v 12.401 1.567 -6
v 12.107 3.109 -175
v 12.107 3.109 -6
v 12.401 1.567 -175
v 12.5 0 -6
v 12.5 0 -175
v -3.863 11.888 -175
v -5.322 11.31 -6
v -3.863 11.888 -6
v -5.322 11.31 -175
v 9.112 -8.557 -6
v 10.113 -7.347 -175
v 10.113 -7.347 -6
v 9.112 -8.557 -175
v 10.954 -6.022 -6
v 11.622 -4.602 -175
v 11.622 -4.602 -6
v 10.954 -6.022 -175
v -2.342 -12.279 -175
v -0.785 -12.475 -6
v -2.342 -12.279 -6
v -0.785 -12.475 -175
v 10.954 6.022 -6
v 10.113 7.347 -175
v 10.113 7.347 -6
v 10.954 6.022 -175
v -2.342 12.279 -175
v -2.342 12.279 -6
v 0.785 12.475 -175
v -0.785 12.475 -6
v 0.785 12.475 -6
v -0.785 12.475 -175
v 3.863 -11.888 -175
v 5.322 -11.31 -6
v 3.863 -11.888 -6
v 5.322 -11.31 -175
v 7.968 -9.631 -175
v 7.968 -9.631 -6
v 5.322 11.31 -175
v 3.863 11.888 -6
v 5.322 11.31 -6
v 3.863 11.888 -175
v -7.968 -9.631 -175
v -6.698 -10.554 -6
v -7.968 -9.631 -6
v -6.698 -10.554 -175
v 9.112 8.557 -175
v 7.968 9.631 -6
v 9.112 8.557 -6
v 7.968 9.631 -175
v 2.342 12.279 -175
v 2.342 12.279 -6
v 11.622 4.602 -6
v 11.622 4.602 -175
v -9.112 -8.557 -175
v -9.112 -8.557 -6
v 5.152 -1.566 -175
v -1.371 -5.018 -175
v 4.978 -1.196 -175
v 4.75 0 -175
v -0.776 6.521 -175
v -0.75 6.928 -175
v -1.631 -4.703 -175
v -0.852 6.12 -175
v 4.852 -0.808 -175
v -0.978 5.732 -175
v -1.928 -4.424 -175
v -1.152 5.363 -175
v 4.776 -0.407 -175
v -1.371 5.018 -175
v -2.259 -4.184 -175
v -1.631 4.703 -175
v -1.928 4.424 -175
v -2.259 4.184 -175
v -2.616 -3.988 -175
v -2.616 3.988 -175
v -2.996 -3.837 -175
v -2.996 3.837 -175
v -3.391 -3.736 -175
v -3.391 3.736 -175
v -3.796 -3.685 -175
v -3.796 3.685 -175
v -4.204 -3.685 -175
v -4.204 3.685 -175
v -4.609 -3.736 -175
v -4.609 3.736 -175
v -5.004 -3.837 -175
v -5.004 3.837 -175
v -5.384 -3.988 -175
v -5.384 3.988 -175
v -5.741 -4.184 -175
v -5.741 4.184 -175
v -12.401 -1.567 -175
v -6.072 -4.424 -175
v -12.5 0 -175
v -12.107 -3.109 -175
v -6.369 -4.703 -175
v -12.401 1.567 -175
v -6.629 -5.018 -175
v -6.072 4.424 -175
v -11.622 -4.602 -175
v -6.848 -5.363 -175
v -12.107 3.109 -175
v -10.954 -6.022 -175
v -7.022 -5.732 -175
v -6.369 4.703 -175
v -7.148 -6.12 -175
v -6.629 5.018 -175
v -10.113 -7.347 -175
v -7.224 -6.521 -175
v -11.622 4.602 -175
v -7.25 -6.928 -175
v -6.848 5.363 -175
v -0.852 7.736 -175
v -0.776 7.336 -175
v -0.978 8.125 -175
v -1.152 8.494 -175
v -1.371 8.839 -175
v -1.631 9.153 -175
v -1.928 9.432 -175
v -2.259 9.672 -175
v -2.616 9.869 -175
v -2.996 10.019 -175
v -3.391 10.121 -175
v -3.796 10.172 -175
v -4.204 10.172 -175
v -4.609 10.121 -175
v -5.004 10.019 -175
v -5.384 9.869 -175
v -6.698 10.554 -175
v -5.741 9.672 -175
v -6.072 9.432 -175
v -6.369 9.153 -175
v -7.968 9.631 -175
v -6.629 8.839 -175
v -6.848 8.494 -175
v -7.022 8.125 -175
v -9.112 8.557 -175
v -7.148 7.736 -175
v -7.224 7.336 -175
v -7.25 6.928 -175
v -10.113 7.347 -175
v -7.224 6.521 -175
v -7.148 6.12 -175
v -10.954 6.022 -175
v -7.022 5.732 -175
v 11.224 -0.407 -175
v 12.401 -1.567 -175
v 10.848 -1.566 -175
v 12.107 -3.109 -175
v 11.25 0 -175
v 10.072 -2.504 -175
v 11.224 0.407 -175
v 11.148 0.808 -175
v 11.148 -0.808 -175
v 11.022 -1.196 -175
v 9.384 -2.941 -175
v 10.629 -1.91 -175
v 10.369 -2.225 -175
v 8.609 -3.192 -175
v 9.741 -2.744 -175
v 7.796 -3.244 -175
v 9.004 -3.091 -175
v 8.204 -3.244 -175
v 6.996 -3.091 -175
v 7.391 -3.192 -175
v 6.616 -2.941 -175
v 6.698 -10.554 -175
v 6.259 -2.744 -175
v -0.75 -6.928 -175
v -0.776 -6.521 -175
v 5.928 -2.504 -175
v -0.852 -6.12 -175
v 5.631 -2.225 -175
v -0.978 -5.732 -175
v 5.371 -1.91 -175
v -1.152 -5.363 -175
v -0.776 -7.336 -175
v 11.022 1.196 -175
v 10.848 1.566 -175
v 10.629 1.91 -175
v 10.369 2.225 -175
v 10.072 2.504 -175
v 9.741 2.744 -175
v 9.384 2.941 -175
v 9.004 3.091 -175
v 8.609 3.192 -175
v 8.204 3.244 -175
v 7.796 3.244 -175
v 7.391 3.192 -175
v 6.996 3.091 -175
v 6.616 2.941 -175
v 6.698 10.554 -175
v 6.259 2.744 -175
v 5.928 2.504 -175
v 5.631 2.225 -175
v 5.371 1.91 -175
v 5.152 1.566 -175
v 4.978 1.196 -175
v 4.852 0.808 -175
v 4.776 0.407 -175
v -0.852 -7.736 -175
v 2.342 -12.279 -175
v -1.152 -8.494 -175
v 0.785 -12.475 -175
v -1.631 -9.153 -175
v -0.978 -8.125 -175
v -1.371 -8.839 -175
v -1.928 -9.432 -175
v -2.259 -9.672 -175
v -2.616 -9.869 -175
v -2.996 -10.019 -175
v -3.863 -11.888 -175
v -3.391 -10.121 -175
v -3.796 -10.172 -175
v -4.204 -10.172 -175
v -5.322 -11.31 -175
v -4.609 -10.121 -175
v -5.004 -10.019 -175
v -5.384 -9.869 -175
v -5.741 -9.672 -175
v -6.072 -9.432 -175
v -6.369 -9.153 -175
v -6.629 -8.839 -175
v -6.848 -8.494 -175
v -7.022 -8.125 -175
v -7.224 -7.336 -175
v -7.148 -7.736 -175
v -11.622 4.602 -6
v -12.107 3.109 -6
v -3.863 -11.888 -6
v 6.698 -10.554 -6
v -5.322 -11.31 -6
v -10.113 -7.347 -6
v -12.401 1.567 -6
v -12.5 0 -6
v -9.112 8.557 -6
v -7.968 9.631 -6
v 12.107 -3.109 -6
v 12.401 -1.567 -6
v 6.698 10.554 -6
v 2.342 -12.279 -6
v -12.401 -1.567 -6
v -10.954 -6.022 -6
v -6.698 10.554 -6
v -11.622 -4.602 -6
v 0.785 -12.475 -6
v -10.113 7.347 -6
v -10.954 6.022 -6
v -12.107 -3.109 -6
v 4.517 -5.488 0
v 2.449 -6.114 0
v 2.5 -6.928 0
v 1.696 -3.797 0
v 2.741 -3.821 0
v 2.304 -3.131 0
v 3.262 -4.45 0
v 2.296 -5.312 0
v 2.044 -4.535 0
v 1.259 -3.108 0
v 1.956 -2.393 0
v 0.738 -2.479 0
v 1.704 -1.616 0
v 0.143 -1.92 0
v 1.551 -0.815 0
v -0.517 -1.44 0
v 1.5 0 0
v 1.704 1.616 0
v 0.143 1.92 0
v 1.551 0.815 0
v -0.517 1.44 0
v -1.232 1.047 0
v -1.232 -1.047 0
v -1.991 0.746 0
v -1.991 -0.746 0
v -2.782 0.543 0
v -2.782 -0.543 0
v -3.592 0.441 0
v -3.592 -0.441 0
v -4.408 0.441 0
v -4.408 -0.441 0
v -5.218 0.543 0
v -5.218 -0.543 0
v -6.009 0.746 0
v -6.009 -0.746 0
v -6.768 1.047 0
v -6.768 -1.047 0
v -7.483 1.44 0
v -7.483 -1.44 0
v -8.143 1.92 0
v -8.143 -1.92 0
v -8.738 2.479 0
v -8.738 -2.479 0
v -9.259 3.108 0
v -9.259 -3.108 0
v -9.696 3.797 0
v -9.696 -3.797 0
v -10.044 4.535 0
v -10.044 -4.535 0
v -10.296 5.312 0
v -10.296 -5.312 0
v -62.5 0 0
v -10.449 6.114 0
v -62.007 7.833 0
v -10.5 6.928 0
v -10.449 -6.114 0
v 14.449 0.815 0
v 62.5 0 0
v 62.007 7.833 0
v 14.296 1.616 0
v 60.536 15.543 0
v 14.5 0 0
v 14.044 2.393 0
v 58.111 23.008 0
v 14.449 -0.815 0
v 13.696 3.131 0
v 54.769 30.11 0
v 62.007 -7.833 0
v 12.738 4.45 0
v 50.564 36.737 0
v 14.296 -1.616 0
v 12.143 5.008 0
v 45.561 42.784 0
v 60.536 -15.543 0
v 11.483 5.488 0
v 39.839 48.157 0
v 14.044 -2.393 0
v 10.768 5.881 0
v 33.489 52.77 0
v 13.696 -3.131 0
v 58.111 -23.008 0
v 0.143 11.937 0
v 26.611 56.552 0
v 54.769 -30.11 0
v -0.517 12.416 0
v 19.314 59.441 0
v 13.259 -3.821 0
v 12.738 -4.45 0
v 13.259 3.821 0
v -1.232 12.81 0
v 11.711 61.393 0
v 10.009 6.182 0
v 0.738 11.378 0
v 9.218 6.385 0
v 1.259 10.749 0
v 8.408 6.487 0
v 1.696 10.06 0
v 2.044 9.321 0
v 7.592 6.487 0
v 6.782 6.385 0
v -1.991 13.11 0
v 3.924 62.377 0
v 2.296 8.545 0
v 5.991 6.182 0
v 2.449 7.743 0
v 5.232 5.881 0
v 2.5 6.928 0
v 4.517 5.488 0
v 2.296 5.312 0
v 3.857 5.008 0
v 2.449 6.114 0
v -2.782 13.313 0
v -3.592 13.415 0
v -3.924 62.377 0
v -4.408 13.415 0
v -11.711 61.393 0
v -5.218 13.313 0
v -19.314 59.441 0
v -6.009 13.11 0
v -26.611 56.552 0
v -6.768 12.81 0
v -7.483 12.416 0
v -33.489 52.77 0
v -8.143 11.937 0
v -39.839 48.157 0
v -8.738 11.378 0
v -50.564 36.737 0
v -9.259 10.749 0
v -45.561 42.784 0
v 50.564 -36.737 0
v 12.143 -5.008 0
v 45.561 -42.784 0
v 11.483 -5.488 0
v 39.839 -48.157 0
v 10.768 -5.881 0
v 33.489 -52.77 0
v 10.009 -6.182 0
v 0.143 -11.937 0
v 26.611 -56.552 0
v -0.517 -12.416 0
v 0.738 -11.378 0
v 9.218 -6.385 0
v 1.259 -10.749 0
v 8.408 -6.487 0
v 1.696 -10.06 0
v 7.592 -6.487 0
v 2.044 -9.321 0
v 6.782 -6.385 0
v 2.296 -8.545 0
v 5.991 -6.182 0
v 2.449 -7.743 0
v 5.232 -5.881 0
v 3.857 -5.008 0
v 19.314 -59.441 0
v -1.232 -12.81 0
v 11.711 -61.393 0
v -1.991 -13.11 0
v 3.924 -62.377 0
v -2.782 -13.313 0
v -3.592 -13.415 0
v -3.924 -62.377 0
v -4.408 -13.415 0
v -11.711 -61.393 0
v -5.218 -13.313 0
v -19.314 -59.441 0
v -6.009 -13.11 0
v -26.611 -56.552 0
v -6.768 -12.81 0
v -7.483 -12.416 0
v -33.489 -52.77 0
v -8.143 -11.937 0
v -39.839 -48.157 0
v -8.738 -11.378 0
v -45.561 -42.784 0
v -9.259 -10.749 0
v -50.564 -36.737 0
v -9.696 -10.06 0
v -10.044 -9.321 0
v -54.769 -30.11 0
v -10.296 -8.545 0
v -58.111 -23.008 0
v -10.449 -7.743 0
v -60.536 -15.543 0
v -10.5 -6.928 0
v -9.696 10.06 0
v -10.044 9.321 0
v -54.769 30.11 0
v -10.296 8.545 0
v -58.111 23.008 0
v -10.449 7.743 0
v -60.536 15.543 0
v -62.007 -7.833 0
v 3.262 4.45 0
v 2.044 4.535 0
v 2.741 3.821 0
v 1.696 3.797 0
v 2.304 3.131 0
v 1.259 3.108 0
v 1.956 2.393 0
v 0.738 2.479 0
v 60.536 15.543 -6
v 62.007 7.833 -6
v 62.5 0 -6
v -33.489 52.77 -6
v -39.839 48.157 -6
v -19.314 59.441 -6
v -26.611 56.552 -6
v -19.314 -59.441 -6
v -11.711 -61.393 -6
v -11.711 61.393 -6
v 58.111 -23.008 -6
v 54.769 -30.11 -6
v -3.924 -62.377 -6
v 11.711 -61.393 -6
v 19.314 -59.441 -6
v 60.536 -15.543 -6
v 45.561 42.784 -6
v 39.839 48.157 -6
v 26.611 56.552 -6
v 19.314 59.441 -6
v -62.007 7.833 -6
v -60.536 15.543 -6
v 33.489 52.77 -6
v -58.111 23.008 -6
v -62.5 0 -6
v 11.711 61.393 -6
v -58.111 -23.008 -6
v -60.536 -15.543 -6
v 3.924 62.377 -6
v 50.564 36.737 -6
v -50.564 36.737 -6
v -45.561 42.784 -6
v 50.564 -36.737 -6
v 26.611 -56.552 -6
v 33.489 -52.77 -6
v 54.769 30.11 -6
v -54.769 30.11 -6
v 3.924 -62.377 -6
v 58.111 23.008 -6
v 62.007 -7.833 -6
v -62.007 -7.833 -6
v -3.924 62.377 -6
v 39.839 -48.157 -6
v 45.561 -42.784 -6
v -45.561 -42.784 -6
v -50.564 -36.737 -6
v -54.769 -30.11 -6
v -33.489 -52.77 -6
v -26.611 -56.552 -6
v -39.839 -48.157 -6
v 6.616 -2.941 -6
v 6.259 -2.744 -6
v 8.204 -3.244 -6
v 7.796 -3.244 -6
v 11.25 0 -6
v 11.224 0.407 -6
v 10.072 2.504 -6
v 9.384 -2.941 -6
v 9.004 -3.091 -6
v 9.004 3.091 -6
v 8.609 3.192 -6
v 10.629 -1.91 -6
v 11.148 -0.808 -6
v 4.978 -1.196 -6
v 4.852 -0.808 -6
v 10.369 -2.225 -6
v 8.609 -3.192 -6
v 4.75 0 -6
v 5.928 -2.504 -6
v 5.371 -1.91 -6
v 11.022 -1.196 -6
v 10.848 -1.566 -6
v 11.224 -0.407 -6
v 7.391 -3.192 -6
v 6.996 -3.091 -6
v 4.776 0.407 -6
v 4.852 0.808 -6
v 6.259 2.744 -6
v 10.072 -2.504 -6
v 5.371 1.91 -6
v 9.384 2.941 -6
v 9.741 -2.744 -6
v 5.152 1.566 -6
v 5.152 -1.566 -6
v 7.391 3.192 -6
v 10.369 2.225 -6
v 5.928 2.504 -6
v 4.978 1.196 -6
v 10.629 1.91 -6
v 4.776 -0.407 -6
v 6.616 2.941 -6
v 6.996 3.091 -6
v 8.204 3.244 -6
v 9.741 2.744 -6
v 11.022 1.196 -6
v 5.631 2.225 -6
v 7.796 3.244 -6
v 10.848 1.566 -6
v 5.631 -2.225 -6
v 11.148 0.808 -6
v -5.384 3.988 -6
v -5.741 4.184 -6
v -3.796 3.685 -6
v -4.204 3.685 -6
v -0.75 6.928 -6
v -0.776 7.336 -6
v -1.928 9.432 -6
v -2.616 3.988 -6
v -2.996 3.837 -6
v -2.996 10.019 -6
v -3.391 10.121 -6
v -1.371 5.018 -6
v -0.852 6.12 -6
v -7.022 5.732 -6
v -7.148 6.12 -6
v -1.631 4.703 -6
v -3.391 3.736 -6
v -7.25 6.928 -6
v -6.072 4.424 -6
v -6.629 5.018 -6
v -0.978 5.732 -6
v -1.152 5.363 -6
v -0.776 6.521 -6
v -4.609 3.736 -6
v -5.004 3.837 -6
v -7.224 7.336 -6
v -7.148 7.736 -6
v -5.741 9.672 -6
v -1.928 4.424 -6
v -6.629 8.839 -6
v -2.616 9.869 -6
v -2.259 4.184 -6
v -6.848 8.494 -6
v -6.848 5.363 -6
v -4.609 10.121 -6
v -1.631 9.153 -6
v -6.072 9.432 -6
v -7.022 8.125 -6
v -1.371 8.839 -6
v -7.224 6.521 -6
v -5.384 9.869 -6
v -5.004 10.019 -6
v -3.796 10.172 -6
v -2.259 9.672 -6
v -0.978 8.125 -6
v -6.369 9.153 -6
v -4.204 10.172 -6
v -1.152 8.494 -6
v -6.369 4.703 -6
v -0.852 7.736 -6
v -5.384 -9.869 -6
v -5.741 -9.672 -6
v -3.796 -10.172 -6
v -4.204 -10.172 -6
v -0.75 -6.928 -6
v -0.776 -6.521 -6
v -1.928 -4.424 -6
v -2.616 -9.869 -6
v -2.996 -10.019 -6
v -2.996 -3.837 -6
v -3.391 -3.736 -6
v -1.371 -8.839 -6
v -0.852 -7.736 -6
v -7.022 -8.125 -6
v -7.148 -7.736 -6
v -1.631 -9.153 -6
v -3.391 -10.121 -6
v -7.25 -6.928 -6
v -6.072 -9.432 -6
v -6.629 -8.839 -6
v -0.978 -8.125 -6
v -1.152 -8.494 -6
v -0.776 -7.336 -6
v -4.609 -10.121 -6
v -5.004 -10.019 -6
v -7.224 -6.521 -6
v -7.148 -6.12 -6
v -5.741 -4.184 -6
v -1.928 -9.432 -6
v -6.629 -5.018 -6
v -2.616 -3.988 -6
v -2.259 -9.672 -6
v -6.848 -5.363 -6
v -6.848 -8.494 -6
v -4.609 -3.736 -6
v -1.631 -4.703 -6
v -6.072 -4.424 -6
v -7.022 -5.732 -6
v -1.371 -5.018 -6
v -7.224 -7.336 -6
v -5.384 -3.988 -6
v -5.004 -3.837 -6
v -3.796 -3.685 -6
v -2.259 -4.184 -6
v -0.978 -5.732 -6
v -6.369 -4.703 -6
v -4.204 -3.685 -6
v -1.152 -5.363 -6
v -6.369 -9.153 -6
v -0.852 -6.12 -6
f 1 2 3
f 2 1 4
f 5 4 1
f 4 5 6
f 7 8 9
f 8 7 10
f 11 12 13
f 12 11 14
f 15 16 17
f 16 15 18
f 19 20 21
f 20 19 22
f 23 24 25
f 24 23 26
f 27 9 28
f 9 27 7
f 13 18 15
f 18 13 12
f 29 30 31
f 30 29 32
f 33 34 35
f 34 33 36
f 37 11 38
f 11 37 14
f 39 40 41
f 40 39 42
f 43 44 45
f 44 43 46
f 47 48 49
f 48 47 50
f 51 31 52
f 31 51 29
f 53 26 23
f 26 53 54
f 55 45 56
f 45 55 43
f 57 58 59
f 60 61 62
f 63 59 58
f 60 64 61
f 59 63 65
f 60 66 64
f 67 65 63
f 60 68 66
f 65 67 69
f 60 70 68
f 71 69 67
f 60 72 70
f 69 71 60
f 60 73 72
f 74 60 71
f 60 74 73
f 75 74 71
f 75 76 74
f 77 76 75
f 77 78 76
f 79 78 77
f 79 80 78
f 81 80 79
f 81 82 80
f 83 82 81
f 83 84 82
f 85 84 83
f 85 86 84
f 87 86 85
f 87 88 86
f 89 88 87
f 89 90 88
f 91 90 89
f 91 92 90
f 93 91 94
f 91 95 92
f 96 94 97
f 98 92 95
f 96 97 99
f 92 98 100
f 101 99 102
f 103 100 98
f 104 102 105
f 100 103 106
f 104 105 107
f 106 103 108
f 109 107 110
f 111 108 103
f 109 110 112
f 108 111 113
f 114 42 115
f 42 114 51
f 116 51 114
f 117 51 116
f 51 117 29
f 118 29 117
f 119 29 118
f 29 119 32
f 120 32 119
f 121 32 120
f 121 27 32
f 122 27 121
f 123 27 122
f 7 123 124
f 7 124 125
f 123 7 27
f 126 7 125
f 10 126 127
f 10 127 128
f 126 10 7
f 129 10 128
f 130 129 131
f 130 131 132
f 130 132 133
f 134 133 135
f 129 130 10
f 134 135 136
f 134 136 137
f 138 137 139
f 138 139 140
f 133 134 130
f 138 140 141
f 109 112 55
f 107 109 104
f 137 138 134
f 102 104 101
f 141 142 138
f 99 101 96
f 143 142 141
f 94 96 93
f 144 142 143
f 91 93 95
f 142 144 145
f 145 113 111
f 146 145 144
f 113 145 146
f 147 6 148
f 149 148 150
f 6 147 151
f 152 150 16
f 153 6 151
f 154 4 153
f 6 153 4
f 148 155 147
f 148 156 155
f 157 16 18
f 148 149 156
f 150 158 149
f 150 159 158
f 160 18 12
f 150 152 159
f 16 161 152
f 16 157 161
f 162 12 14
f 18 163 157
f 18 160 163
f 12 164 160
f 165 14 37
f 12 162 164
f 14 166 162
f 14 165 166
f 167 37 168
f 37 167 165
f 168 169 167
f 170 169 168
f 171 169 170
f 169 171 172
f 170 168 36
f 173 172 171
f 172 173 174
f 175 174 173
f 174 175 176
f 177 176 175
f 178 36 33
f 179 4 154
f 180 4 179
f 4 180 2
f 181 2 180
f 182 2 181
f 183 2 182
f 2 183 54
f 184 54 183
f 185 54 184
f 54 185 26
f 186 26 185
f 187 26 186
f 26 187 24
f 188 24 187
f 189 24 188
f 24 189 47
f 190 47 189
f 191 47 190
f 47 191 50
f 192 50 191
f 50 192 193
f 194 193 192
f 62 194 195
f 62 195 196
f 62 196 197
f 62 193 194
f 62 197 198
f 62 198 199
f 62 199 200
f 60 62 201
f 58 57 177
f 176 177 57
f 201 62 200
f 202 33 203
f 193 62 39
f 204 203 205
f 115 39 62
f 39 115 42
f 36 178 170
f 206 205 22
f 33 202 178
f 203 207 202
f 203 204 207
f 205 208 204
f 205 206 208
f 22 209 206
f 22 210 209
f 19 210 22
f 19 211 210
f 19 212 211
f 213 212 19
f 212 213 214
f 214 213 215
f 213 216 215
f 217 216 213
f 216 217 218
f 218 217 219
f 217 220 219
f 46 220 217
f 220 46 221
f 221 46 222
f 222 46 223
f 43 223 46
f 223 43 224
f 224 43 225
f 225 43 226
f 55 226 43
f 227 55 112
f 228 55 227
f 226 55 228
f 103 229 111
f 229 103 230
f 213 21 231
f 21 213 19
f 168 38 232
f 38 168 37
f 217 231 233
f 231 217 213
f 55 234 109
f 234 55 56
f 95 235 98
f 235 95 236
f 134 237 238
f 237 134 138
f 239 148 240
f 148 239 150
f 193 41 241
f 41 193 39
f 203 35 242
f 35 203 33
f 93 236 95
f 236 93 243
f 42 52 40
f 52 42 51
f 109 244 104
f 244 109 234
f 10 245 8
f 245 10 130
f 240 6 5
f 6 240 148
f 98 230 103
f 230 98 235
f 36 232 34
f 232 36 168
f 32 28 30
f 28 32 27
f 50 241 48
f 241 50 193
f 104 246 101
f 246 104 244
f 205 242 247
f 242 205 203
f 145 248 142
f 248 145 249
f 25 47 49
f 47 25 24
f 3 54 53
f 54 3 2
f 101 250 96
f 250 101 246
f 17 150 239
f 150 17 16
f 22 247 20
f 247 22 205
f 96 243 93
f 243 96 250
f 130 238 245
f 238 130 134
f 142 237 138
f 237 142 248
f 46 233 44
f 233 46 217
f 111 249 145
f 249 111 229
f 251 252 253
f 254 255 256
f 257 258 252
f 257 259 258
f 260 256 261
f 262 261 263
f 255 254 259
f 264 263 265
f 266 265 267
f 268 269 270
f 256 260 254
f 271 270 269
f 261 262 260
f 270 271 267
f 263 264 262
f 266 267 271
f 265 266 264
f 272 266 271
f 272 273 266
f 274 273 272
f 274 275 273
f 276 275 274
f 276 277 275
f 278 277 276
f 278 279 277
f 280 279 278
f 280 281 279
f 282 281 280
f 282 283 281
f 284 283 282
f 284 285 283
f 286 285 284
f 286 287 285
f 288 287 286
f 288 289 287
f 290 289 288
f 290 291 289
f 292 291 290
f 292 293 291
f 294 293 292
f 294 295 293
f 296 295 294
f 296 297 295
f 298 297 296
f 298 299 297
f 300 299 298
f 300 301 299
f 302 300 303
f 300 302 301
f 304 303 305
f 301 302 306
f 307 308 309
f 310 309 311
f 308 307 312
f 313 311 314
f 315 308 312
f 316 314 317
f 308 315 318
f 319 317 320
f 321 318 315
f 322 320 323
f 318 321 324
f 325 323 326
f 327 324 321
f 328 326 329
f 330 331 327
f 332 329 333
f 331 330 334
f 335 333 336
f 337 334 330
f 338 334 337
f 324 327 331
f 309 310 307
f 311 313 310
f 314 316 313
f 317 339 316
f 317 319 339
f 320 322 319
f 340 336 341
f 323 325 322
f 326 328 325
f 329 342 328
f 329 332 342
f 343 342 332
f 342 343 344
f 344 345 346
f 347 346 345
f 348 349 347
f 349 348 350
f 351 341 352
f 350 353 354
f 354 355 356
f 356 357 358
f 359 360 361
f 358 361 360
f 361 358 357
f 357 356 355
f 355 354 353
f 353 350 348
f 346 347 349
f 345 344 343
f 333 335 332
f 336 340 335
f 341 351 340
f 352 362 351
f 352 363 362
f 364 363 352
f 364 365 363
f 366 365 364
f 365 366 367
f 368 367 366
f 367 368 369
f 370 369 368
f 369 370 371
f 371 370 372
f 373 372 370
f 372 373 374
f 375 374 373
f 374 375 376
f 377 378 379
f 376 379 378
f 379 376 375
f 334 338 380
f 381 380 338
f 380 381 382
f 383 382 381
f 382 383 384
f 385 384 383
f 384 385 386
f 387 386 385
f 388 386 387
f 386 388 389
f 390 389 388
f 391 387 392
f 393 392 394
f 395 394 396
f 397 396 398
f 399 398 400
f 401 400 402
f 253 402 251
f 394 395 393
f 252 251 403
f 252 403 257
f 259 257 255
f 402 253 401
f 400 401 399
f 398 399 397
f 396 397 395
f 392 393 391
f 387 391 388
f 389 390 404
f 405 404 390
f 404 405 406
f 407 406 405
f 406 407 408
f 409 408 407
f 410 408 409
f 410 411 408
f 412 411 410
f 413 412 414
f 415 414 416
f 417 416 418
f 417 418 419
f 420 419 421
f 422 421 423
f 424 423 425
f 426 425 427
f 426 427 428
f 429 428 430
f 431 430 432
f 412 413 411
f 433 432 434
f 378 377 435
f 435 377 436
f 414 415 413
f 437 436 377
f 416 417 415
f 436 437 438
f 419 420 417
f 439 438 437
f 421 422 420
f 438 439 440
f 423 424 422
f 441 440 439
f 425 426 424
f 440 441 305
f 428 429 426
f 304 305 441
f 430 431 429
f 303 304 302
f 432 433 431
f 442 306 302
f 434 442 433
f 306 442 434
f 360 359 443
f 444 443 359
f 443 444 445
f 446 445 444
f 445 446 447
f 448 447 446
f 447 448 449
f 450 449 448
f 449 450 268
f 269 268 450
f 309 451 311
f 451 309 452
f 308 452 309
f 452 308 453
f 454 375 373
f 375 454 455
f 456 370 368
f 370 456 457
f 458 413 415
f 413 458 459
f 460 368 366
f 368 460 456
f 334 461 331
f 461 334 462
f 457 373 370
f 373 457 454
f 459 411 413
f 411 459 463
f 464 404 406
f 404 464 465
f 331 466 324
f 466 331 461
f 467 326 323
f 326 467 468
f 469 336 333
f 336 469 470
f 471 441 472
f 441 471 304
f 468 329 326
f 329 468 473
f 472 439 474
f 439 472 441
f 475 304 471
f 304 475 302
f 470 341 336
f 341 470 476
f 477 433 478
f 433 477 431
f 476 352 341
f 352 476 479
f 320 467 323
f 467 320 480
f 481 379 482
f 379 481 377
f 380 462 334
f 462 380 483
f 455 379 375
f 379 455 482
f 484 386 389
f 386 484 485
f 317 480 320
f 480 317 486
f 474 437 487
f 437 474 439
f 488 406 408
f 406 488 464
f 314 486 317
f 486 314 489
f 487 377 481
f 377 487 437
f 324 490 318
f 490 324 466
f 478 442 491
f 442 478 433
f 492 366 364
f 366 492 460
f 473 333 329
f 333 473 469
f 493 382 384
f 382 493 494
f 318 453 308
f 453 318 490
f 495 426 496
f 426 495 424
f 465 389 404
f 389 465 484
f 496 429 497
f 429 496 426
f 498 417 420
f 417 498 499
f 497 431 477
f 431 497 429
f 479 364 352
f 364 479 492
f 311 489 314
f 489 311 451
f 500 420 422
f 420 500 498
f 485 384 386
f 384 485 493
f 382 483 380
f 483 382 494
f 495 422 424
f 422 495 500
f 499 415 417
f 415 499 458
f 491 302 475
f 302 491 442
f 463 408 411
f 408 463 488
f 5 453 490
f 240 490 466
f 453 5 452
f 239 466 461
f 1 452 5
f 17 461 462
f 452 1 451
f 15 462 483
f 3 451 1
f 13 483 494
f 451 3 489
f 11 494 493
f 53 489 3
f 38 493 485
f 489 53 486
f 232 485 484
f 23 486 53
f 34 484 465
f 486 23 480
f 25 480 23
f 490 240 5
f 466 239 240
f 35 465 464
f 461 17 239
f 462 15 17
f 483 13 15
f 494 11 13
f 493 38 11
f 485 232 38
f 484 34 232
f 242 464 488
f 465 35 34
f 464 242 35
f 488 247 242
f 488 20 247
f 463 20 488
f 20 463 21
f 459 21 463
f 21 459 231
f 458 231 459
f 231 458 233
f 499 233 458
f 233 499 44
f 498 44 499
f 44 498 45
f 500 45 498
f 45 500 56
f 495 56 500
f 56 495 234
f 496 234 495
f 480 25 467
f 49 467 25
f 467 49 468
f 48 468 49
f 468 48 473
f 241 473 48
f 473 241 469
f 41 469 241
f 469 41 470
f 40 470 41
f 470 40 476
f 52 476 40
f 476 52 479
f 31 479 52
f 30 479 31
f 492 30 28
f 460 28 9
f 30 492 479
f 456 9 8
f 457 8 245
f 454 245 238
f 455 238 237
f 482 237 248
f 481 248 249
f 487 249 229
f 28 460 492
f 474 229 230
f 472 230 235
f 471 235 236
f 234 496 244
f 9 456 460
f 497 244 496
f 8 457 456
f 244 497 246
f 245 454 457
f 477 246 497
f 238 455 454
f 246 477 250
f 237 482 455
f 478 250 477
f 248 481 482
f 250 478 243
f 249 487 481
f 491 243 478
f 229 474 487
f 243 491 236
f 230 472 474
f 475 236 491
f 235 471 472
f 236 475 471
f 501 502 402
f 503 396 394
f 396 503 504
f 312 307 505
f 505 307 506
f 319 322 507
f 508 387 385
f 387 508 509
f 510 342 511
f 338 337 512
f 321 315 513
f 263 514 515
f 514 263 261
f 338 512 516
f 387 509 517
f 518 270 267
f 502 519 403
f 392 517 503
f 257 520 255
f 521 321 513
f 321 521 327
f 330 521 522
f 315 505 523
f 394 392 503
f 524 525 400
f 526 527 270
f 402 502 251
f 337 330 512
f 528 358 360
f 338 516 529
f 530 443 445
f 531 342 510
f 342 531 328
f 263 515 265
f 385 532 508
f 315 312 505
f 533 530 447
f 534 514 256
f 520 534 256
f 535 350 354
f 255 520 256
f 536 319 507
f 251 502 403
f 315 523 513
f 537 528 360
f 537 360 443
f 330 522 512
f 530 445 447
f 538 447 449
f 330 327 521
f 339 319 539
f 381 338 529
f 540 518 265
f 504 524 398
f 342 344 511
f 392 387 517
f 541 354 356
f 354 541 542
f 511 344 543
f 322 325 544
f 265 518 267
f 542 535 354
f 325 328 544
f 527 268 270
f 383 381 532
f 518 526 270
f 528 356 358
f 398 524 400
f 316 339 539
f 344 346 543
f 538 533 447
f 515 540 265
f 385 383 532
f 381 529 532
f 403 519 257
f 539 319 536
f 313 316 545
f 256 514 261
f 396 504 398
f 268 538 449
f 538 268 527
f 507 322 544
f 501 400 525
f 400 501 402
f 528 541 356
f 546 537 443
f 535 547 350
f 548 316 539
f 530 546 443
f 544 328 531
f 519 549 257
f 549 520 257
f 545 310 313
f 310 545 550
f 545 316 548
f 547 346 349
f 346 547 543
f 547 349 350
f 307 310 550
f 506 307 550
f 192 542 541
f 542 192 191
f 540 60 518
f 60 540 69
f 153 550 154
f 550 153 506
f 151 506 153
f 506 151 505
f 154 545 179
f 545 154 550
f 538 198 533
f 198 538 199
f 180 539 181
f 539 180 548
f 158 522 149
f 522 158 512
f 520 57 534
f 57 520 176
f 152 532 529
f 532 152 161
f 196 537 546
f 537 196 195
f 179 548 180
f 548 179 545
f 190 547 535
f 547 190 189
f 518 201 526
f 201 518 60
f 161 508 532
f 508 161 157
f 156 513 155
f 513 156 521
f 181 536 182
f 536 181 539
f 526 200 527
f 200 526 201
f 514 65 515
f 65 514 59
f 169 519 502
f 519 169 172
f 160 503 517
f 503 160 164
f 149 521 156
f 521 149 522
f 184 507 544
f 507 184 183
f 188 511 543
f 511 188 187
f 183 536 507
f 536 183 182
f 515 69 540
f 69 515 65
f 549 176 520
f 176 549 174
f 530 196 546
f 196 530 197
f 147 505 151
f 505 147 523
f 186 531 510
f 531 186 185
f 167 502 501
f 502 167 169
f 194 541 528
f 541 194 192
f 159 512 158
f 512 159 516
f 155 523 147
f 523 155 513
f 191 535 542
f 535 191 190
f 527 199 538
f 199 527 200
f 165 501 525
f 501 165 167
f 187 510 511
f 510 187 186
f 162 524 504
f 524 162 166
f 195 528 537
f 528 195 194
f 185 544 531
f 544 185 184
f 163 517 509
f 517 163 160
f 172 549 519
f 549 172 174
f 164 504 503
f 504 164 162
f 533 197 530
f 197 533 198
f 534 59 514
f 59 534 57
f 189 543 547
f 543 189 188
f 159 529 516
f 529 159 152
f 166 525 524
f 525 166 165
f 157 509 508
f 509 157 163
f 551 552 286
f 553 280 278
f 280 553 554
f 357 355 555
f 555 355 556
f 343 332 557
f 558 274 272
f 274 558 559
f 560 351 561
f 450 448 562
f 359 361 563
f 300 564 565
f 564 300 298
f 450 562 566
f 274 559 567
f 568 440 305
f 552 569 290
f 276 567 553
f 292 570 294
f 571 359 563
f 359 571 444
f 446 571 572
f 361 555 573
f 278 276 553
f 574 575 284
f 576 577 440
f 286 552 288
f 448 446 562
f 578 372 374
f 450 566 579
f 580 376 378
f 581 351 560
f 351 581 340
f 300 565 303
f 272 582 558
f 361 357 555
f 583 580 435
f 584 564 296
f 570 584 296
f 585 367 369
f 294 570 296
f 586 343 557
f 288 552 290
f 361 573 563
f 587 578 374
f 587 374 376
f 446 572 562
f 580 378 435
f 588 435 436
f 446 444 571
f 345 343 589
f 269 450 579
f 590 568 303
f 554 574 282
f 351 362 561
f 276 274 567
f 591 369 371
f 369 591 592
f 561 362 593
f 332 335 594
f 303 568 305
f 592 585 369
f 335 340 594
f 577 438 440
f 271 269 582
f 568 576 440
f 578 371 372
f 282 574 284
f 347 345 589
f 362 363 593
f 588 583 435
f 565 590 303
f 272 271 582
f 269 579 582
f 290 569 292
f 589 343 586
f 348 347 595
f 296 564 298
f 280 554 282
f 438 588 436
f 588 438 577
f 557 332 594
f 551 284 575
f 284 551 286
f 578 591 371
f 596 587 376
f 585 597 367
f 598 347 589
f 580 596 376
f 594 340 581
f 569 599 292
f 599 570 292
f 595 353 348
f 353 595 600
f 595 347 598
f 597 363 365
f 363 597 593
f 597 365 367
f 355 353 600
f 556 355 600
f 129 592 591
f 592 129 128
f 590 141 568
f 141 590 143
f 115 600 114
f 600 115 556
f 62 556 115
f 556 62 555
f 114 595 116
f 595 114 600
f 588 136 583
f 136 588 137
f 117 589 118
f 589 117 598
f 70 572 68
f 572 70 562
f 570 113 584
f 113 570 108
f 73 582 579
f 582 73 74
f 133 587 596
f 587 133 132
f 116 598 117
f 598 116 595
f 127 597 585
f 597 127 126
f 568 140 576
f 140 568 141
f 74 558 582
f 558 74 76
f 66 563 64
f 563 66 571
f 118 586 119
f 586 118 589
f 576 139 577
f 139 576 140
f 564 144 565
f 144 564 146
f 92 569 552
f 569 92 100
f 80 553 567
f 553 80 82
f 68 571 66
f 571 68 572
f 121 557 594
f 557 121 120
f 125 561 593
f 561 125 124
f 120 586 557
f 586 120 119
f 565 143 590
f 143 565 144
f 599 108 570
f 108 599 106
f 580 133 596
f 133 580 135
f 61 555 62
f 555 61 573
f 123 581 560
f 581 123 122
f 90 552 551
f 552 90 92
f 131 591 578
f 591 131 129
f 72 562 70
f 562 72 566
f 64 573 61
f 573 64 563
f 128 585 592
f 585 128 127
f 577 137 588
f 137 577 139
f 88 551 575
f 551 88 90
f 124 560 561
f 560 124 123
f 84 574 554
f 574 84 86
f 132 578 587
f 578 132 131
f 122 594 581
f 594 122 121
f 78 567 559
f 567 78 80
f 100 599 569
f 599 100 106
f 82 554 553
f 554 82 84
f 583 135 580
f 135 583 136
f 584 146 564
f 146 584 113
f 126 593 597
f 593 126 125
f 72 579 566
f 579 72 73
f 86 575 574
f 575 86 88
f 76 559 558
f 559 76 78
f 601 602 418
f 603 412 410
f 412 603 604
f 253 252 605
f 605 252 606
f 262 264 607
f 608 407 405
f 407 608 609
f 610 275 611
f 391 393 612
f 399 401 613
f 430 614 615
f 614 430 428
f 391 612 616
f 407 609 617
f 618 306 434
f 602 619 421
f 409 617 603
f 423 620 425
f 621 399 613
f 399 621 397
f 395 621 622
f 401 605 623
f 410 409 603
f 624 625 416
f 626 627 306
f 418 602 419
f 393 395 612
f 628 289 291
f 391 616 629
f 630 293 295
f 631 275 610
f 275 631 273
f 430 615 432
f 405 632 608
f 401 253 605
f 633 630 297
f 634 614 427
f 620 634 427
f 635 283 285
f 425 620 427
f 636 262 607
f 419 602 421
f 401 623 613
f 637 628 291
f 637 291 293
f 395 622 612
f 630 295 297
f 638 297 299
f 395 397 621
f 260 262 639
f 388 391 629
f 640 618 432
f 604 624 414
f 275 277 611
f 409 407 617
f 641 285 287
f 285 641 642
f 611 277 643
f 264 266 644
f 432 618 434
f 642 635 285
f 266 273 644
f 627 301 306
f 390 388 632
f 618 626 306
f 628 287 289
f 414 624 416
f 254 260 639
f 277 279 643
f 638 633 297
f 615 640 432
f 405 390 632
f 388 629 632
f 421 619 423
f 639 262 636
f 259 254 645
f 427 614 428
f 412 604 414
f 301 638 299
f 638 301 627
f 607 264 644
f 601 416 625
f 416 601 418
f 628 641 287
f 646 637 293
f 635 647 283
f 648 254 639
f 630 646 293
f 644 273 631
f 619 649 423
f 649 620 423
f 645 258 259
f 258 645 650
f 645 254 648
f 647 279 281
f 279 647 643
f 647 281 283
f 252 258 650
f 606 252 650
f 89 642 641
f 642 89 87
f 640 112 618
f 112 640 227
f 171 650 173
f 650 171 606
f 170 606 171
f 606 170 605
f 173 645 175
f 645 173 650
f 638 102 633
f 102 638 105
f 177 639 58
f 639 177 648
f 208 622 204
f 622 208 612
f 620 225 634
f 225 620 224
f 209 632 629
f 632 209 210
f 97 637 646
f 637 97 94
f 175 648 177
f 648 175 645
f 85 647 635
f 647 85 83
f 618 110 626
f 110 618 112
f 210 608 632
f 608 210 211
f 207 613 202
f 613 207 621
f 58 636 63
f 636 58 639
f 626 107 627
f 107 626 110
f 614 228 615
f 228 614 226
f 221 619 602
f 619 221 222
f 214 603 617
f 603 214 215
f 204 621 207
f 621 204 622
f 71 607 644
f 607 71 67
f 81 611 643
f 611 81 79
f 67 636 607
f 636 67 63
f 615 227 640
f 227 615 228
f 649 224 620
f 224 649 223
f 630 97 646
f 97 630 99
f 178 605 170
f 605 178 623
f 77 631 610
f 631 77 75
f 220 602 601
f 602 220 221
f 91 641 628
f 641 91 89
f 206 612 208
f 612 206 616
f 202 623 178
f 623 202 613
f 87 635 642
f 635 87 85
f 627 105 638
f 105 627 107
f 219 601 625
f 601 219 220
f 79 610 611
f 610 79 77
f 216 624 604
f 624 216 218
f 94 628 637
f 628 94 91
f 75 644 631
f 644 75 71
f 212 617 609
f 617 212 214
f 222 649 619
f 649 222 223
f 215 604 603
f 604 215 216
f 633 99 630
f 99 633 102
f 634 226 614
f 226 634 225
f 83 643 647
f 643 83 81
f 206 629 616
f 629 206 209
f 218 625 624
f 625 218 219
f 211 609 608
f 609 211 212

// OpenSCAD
$fn = 50;


difference() {
	union() {
		translate(v = [0, 0, -175.0000000000]) {
			cylinder(h = 175, r = 12.5000000000);
		}
		translate(v = [0, 0, -6.0000000000]) {
			cylinder(h = 6, r = 62.5000000000);
		}
	}
	union() {
		translate(v = [8.0000000000, 0.0000000000, 0]) {
			rotate(a = [0, 0, 0]) {
				difference() {
					union() {
						#translate(v = [0, 0, -175.0000000000]) {
							cylinder(h = 175, r = 2.2500000000);
						}
						#translate(v = [0, 0, -6]) {
							cylinder(h = 6, r = 12.5000000000, r1 = 3.2500000000, r2 = 6.5000000000);
						}
						#translate(v = [0, 0, -175.0000000000]) {
							cylinder(h = 175, r = 3.2500000000);
						}
						#translate(v = [0, 0, -175.0000000000]) {
							cylinder(h = 175, r = 2.2500000000);
						}
					}
					union();
				}
			}
		}
		translate(v = [-4.0000000000, 6.9282032303, 0]) {
			rotate(a = [0, 0, 0]) {
				difference() {
					union() {
						#translate(v = [0, 0, -175.0000000000]) {
							cylinder(h = 175, r = 2.2500000000);
						}
						#translate(v = [0, 0, -6]) {
							cylinder(h = 6, r = 12.5000000000, r1 = 3.2500000000, r2 = 6.5000000000);
						}
						#translate(v = [0, 0, -175.0000000000]) {
							cylinder(h = 175, r = 3.2500000000);
						}
						#translate(v = [0, 0, -175.0000000000]) {
							cylinder(h = 175, r = 2.2500000000);
						}
					}
					union();
				}
			}
		}
		translate(v = [-4.0000000000, -6.9282032303, 0]) {
			rotate(a = [0, 0, 0]) {
				difference() {
					union() {
						#translate(v = [0, 0, -175.0000000000]) {
							cylinder(h = 175, r = 2.2500000000);
						}
						#translate(v = [0, 0, -6]) {
							cylinder(h = 6, r = 12.5000000000, r1 = 3.2500000000, r2 = 6.5000000000);
						}
						#translate(v = [0, 0, -175.0000000000]) {
							cylinder(h = 175, r = 3.2500000000);
						}
						#translate(v = [0, 0, -175.0000000000]) {
							cylinder(h = 175, r = 2.2500000000);
						}
					}
					union();
				}
			}
		}
	}
}
